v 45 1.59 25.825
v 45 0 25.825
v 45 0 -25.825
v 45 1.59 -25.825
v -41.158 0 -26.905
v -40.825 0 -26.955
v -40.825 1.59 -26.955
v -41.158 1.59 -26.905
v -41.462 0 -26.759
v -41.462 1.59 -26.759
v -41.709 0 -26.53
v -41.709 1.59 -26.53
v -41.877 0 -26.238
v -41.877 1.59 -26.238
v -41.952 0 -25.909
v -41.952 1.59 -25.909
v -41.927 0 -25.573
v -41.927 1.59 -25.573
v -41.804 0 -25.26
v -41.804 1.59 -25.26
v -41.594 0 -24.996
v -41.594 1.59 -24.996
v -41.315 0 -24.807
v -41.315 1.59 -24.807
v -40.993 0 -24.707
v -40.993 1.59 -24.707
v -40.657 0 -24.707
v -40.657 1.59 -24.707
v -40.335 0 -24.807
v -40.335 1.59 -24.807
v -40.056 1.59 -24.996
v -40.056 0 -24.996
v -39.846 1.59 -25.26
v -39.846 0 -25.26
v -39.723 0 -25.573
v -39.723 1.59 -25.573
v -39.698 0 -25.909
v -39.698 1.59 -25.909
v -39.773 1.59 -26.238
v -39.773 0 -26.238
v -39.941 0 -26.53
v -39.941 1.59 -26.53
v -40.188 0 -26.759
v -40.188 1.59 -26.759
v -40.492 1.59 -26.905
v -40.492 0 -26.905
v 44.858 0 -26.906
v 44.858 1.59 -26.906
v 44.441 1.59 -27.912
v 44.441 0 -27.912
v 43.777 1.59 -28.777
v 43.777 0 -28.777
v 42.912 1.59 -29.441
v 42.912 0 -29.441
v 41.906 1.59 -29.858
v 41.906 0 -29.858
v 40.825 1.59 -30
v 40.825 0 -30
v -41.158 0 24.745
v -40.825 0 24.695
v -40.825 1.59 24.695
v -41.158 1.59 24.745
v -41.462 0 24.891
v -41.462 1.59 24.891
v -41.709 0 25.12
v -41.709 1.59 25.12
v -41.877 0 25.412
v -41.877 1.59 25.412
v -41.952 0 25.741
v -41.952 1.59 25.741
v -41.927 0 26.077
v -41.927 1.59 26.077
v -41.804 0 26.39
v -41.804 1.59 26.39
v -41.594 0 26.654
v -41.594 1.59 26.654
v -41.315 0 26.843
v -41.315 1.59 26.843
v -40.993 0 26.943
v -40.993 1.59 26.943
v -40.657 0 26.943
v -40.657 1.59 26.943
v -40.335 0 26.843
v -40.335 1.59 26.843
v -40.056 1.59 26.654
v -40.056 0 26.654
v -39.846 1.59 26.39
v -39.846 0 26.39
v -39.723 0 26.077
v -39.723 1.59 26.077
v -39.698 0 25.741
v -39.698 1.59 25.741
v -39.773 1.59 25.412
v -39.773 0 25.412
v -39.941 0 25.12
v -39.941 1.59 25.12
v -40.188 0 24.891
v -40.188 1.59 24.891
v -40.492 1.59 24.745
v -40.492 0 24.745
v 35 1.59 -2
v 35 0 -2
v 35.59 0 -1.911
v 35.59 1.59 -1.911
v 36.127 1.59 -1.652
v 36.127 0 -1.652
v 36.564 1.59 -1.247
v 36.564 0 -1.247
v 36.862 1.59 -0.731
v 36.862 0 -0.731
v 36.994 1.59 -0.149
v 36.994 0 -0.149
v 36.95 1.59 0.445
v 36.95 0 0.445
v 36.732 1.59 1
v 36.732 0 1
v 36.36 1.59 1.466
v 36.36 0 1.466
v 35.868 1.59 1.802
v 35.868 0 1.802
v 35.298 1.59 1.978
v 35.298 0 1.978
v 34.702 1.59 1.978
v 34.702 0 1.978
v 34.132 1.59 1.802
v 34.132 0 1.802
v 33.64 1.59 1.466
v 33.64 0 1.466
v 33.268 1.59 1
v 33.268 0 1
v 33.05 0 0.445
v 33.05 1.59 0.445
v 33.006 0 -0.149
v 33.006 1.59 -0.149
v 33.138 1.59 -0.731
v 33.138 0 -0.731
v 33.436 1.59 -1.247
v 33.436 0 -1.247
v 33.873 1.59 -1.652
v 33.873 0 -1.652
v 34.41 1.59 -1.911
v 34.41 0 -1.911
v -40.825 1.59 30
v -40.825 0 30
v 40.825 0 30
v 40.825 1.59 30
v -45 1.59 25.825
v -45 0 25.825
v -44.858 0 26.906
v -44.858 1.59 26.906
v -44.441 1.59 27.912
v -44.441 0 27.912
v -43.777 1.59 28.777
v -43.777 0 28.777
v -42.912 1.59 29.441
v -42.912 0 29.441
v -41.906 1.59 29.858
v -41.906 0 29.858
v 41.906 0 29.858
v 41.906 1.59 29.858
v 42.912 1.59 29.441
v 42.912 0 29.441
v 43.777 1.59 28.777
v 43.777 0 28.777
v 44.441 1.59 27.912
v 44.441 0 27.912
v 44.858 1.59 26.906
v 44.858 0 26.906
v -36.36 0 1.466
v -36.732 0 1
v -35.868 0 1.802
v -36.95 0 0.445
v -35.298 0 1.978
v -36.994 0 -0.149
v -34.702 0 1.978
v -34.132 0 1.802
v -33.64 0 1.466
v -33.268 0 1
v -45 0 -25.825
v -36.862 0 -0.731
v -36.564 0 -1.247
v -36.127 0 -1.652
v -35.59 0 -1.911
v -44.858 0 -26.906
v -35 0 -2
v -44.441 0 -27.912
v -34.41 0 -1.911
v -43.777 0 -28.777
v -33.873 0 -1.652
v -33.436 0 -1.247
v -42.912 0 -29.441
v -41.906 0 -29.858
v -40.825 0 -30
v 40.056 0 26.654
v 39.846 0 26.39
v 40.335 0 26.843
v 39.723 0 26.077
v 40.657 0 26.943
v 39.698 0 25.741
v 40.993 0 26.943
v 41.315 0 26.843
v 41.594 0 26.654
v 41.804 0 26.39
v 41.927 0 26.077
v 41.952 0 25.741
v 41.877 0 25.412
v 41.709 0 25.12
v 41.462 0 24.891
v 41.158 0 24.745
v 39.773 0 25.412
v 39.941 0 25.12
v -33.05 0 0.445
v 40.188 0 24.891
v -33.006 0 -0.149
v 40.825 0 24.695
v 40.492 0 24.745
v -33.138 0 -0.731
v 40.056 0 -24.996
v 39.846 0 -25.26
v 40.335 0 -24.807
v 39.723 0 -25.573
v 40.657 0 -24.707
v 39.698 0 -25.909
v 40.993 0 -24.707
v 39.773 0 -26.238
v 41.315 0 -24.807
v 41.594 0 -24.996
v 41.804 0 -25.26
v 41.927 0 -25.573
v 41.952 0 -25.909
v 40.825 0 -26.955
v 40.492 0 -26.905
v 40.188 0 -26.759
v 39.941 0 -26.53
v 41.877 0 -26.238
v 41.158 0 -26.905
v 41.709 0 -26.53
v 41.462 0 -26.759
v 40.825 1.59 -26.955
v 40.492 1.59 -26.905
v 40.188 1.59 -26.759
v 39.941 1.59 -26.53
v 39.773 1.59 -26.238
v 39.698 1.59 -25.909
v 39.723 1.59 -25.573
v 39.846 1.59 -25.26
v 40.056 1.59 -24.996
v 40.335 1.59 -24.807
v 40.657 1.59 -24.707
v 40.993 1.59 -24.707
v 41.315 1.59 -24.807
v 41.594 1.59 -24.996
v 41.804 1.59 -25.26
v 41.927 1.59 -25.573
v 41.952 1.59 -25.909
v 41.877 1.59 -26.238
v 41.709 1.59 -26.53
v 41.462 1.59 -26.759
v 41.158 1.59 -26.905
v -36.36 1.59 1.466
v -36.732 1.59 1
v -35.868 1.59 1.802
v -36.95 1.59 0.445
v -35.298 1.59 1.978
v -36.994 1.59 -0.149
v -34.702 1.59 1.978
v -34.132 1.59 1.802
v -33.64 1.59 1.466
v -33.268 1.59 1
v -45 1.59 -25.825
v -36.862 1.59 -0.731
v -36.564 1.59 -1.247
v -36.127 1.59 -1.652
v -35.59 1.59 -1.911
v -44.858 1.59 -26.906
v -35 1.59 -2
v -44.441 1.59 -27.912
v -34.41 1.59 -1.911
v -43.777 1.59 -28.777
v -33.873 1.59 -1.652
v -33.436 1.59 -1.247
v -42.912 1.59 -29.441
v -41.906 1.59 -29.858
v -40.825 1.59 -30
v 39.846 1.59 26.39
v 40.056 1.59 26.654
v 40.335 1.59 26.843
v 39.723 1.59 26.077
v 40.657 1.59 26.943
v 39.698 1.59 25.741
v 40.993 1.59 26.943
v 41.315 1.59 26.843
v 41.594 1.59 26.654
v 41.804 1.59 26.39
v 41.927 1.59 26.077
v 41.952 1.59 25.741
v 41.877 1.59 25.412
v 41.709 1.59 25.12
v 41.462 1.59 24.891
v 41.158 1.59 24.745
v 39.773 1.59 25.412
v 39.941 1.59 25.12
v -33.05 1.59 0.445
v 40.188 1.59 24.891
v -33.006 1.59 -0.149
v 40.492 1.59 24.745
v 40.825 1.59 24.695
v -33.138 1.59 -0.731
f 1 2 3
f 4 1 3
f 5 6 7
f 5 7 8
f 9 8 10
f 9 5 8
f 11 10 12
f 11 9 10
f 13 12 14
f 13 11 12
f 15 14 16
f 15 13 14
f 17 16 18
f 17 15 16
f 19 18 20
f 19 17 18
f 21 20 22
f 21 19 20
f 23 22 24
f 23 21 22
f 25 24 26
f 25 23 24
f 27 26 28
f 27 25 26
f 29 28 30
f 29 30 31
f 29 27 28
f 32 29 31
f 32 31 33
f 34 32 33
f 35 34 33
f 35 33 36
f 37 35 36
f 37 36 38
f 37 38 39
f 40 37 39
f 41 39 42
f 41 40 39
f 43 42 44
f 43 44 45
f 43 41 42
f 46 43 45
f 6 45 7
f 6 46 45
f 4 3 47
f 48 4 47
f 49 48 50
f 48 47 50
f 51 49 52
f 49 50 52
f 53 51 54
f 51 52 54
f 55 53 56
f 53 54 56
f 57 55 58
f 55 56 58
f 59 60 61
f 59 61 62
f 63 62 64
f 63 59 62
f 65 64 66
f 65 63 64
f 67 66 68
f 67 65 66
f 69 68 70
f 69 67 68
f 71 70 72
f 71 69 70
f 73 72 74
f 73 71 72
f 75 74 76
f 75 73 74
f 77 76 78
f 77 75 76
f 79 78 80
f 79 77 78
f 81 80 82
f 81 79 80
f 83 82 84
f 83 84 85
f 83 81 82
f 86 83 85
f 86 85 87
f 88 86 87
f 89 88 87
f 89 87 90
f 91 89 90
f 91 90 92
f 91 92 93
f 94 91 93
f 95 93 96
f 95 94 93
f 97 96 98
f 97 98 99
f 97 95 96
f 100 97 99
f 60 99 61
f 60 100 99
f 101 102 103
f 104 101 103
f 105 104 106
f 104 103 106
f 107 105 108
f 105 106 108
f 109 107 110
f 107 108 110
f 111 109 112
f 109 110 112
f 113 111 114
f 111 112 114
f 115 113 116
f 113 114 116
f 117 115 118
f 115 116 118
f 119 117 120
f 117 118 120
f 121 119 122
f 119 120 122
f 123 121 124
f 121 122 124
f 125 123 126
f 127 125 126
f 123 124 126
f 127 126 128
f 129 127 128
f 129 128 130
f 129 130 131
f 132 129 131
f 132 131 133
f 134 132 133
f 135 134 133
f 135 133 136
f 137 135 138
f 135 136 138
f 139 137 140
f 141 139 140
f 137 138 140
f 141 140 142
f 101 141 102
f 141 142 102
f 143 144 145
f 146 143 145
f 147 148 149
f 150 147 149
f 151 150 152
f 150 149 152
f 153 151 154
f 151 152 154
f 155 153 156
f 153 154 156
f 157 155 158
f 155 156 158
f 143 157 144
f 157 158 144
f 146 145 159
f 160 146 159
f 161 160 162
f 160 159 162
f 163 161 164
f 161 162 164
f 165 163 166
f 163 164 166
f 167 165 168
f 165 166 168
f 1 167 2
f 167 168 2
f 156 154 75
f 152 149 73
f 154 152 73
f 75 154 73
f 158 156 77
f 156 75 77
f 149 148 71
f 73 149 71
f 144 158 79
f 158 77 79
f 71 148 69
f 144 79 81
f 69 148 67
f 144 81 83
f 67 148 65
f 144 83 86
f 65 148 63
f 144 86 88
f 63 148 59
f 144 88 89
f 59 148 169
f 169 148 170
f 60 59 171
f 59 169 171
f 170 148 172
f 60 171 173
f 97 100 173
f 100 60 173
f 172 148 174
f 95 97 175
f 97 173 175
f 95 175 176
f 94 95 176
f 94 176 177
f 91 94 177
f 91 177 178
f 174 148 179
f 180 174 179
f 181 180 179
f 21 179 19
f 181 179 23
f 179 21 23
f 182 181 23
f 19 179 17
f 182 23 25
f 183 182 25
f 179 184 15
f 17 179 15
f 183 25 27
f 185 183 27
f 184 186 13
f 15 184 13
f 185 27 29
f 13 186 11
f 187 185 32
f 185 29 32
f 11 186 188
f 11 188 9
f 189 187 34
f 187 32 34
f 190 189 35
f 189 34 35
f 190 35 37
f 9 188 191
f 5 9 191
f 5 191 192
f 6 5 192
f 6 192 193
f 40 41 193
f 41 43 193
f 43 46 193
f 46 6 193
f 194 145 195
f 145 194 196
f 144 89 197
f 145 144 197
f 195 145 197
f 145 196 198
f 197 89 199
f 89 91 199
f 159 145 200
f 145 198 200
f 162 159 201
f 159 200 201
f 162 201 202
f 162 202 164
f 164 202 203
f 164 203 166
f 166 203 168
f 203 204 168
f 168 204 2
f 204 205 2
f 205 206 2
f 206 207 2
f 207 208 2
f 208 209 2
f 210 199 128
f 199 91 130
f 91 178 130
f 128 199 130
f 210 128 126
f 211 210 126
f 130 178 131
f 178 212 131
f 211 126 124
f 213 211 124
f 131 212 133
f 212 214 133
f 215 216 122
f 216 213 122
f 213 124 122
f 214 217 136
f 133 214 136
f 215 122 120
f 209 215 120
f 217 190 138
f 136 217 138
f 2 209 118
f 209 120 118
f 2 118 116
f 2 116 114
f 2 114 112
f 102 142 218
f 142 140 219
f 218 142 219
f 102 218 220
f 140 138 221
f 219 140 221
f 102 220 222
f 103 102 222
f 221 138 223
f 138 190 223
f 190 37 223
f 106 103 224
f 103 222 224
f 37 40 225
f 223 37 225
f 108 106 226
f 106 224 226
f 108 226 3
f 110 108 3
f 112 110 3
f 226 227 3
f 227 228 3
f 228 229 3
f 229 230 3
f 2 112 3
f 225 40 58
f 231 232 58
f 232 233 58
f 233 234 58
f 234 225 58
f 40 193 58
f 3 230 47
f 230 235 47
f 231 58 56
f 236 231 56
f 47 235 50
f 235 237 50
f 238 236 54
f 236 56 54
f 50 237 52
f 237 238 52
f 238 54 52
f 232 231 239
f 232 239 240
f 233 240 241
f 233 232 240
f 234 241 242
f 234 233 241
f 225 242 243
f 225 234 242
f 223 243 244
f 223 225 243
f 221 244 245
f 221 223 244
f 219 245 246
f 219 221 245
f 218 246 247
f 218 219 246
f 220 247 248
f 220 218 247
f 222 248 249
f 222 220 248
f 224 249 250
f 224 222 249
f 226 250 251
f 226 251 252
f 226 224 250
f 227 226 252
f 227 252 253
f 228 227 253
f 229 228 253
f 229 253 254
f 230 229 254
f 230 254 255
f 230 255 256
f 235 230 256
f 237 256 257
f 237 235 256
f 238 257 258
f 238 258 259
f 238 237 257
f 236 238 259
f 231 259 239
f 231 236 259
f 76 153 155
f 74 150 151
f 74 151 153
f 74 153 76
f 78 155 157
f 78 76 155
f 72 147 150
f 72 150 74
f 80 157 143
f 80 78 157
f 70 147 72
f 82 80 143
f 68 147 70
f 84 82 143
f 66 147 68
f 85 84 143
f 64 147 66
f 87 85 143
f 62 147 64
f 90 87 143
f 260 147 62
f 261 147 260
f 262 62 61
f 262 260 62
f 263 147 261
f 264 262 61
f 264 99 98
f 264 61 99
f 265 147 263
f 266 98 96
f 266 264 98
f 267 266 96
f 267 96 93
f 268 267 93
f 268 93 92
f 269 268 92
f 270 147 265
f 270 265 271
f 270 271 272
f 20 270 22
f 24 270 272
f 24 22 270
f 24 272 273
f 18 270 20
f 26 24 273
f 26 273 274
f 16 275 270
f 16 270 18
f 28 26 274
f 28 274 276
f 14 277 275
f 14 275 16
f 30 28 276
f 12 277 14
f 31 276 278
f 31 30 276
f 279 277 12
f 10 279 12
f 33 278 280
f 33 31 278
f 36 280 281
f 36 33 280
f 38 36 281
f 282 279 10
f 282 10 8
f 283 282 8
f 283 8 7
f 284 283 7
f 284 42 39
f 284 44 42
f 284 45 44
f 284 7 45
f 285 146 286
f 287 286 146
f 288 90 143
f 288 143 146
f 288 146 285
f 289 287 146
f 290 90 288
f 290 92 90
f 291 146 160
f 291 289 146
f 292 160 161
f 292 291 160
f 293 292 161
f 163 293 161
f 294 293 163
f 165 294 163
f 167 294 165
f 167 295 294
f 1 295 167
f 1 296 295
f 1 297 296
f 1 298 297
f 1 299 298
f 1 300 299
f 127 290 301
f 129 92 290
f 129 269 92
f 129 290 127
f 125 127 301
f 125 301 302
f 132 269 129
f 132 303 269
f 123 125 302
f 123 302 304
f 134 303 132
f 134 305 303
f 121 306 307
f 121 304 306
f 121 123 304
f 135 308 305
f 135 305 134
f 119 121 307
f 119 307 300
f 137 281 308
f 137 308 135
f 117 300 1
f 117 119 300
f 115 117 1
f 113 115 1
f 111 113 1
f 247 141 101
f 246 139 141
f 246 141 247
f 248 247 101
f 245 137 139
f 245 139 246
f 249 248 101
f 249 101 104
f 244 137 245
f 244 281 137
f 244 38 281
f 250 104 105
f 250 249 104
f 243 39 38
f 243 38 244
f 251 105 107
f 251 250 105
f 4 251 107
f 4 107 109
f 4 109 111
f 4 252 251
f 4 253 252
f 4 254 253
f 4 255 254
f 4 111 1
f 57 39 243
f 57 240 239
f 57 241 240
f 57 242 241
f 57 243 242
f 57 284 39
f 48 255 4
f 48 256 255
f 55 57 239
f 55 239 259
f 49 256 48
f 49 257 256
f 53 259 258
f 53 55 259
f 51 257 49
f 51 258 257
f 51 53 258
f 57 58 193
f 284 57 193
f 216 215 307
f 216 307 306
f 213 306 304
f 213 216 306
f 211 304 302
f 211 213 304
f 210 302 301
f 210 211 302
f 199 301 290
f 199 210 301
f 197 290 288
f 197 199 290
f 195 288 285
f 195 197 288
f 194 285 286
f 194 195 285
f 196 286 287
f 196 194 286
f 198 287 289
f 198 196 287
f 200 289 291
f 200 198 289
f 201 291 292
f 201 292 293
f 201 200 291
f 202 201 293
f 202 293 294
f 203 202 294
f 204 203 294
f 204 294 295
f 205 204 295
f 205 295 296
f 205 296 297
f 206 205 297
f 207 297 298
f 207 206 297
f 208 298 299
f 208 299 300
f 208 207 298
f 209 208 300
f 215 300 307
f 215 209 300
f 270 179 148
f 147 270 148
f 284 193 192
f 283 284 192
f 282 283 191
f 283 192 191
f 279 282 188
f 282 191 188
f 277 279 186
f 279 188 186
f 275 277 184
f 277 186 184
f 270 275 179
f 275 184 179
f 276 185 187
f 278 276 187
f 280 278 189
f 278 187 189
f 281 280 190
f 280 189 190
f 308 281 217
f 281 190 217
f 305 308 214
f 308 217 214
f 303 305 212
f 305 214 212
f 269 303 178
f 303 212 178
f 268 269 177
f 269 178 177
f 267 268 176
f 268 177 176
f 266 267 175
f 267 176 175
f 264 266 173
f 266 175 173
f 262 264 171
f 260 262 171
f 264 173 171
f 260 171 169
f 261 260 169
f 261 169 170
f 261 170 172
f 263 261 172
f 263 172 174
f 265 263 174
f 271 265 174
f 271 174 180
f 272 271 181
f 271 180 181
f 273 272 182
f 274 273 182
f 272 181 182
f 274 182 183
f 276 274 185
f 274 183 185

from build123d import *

# Parameters (mm, degrees)
SKETCH2_R           = 1.1303
BOSS_EXTRUDE3_DEPTH = 1.59
SKETCH3_R           = 2
CUT_EXTRUDE1_DEPTH  = 1.59


with BuildPart() as part:
    # Sketch2 → Boss-Extrude3 (new body)
    with BuildSketch(Plane(origin=(0, 0, 0), x_dir=(1, 0, 0), z_dir=(0, 1, 0))):
        with BuildLine():
            Line((-45, 25.825), (-45, -25.825))
            ThreePointArc((-45, -25.825), (-43.777170811, -28.777170811), (-40.825, -30))
            Line((-40.825, -30), (40.825, -30))
            ThreePointArc((40.825, -30), (43.777170811, -28.777170811), (45, -25.825))
            Line((45, -25.825), (45, 25.825))
            ThreePointArc((45, 25.825), (43.777170811, 28.777170811), (40.825, 30))
            Line((40.825, 30), (-40.825, 30))
            ThreePointArc((-40.825, 30), (-43.777170811, 28.777170811), (-45, 25.825))
        make_face()
        with Locations(Location((40.825, 25.825, 0), (0, 0, 90))):
            Circle(SKETCH2_R, mode=Mode.SUBTRACT)
        with Locations(Location((-40.825, 25.825, 0), (0, 0, 90))):
            Circle(SKETCH2_R, mode=Mode.SUBTRACT)
        with Locations(Location((-40.825, -25.825, 0), (0, 0, 90))):
            Circle(SKETCH2_R, mode=Mode.SUBTRACT)
        with Locations(Location((40.825, -25.825, 0), (0, 0, 90))):
            Circle(SKETCH2_R, mode=Mode.SUBTRACT)
    extrude(amount=BOSS_EXTRUDE3_DEPTH)

    # Sketch3 → Cut-Extrude1 (cut)
    with BuildSketch(Plane.XZ):
        with Locations(Location((-35, 0, 0), (0, 0, 270))):
            Circle(SKETCH3_R)
        with Locations(Location((35, 0, 0), (0, 0, 270))):
            Circle(SKETCH3_R)
    extrude(amount=-CUT_EXTRUDE1_DEPTH, mode=Mode.SUBTRACT)


solid = part.part
